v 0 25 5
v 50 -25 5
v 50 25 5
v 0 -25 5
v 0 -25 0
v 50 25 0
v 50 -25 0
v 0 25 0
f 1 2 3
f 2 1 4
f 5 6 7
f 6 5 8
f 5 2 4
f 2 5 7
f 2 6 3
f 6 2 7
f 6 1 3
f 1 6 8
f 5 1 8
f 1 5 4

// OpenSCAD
// file: Library/center.scad
module center(axis){
	translate((axis / -2.0)){
		children();
	}
}
// main file
use <Library/center.scad>
//Length, width, height. The length is how long the rail is, starting at the center of the flue, going back.
dimensions = [50, 50, 5];
module CylinderDispenser_Rail_Floor(dimensions){
	center([0, dimensions[1], 0]) cube(dimensions);
}
CylinderDispenser_Rail_Floor(dimensions);
